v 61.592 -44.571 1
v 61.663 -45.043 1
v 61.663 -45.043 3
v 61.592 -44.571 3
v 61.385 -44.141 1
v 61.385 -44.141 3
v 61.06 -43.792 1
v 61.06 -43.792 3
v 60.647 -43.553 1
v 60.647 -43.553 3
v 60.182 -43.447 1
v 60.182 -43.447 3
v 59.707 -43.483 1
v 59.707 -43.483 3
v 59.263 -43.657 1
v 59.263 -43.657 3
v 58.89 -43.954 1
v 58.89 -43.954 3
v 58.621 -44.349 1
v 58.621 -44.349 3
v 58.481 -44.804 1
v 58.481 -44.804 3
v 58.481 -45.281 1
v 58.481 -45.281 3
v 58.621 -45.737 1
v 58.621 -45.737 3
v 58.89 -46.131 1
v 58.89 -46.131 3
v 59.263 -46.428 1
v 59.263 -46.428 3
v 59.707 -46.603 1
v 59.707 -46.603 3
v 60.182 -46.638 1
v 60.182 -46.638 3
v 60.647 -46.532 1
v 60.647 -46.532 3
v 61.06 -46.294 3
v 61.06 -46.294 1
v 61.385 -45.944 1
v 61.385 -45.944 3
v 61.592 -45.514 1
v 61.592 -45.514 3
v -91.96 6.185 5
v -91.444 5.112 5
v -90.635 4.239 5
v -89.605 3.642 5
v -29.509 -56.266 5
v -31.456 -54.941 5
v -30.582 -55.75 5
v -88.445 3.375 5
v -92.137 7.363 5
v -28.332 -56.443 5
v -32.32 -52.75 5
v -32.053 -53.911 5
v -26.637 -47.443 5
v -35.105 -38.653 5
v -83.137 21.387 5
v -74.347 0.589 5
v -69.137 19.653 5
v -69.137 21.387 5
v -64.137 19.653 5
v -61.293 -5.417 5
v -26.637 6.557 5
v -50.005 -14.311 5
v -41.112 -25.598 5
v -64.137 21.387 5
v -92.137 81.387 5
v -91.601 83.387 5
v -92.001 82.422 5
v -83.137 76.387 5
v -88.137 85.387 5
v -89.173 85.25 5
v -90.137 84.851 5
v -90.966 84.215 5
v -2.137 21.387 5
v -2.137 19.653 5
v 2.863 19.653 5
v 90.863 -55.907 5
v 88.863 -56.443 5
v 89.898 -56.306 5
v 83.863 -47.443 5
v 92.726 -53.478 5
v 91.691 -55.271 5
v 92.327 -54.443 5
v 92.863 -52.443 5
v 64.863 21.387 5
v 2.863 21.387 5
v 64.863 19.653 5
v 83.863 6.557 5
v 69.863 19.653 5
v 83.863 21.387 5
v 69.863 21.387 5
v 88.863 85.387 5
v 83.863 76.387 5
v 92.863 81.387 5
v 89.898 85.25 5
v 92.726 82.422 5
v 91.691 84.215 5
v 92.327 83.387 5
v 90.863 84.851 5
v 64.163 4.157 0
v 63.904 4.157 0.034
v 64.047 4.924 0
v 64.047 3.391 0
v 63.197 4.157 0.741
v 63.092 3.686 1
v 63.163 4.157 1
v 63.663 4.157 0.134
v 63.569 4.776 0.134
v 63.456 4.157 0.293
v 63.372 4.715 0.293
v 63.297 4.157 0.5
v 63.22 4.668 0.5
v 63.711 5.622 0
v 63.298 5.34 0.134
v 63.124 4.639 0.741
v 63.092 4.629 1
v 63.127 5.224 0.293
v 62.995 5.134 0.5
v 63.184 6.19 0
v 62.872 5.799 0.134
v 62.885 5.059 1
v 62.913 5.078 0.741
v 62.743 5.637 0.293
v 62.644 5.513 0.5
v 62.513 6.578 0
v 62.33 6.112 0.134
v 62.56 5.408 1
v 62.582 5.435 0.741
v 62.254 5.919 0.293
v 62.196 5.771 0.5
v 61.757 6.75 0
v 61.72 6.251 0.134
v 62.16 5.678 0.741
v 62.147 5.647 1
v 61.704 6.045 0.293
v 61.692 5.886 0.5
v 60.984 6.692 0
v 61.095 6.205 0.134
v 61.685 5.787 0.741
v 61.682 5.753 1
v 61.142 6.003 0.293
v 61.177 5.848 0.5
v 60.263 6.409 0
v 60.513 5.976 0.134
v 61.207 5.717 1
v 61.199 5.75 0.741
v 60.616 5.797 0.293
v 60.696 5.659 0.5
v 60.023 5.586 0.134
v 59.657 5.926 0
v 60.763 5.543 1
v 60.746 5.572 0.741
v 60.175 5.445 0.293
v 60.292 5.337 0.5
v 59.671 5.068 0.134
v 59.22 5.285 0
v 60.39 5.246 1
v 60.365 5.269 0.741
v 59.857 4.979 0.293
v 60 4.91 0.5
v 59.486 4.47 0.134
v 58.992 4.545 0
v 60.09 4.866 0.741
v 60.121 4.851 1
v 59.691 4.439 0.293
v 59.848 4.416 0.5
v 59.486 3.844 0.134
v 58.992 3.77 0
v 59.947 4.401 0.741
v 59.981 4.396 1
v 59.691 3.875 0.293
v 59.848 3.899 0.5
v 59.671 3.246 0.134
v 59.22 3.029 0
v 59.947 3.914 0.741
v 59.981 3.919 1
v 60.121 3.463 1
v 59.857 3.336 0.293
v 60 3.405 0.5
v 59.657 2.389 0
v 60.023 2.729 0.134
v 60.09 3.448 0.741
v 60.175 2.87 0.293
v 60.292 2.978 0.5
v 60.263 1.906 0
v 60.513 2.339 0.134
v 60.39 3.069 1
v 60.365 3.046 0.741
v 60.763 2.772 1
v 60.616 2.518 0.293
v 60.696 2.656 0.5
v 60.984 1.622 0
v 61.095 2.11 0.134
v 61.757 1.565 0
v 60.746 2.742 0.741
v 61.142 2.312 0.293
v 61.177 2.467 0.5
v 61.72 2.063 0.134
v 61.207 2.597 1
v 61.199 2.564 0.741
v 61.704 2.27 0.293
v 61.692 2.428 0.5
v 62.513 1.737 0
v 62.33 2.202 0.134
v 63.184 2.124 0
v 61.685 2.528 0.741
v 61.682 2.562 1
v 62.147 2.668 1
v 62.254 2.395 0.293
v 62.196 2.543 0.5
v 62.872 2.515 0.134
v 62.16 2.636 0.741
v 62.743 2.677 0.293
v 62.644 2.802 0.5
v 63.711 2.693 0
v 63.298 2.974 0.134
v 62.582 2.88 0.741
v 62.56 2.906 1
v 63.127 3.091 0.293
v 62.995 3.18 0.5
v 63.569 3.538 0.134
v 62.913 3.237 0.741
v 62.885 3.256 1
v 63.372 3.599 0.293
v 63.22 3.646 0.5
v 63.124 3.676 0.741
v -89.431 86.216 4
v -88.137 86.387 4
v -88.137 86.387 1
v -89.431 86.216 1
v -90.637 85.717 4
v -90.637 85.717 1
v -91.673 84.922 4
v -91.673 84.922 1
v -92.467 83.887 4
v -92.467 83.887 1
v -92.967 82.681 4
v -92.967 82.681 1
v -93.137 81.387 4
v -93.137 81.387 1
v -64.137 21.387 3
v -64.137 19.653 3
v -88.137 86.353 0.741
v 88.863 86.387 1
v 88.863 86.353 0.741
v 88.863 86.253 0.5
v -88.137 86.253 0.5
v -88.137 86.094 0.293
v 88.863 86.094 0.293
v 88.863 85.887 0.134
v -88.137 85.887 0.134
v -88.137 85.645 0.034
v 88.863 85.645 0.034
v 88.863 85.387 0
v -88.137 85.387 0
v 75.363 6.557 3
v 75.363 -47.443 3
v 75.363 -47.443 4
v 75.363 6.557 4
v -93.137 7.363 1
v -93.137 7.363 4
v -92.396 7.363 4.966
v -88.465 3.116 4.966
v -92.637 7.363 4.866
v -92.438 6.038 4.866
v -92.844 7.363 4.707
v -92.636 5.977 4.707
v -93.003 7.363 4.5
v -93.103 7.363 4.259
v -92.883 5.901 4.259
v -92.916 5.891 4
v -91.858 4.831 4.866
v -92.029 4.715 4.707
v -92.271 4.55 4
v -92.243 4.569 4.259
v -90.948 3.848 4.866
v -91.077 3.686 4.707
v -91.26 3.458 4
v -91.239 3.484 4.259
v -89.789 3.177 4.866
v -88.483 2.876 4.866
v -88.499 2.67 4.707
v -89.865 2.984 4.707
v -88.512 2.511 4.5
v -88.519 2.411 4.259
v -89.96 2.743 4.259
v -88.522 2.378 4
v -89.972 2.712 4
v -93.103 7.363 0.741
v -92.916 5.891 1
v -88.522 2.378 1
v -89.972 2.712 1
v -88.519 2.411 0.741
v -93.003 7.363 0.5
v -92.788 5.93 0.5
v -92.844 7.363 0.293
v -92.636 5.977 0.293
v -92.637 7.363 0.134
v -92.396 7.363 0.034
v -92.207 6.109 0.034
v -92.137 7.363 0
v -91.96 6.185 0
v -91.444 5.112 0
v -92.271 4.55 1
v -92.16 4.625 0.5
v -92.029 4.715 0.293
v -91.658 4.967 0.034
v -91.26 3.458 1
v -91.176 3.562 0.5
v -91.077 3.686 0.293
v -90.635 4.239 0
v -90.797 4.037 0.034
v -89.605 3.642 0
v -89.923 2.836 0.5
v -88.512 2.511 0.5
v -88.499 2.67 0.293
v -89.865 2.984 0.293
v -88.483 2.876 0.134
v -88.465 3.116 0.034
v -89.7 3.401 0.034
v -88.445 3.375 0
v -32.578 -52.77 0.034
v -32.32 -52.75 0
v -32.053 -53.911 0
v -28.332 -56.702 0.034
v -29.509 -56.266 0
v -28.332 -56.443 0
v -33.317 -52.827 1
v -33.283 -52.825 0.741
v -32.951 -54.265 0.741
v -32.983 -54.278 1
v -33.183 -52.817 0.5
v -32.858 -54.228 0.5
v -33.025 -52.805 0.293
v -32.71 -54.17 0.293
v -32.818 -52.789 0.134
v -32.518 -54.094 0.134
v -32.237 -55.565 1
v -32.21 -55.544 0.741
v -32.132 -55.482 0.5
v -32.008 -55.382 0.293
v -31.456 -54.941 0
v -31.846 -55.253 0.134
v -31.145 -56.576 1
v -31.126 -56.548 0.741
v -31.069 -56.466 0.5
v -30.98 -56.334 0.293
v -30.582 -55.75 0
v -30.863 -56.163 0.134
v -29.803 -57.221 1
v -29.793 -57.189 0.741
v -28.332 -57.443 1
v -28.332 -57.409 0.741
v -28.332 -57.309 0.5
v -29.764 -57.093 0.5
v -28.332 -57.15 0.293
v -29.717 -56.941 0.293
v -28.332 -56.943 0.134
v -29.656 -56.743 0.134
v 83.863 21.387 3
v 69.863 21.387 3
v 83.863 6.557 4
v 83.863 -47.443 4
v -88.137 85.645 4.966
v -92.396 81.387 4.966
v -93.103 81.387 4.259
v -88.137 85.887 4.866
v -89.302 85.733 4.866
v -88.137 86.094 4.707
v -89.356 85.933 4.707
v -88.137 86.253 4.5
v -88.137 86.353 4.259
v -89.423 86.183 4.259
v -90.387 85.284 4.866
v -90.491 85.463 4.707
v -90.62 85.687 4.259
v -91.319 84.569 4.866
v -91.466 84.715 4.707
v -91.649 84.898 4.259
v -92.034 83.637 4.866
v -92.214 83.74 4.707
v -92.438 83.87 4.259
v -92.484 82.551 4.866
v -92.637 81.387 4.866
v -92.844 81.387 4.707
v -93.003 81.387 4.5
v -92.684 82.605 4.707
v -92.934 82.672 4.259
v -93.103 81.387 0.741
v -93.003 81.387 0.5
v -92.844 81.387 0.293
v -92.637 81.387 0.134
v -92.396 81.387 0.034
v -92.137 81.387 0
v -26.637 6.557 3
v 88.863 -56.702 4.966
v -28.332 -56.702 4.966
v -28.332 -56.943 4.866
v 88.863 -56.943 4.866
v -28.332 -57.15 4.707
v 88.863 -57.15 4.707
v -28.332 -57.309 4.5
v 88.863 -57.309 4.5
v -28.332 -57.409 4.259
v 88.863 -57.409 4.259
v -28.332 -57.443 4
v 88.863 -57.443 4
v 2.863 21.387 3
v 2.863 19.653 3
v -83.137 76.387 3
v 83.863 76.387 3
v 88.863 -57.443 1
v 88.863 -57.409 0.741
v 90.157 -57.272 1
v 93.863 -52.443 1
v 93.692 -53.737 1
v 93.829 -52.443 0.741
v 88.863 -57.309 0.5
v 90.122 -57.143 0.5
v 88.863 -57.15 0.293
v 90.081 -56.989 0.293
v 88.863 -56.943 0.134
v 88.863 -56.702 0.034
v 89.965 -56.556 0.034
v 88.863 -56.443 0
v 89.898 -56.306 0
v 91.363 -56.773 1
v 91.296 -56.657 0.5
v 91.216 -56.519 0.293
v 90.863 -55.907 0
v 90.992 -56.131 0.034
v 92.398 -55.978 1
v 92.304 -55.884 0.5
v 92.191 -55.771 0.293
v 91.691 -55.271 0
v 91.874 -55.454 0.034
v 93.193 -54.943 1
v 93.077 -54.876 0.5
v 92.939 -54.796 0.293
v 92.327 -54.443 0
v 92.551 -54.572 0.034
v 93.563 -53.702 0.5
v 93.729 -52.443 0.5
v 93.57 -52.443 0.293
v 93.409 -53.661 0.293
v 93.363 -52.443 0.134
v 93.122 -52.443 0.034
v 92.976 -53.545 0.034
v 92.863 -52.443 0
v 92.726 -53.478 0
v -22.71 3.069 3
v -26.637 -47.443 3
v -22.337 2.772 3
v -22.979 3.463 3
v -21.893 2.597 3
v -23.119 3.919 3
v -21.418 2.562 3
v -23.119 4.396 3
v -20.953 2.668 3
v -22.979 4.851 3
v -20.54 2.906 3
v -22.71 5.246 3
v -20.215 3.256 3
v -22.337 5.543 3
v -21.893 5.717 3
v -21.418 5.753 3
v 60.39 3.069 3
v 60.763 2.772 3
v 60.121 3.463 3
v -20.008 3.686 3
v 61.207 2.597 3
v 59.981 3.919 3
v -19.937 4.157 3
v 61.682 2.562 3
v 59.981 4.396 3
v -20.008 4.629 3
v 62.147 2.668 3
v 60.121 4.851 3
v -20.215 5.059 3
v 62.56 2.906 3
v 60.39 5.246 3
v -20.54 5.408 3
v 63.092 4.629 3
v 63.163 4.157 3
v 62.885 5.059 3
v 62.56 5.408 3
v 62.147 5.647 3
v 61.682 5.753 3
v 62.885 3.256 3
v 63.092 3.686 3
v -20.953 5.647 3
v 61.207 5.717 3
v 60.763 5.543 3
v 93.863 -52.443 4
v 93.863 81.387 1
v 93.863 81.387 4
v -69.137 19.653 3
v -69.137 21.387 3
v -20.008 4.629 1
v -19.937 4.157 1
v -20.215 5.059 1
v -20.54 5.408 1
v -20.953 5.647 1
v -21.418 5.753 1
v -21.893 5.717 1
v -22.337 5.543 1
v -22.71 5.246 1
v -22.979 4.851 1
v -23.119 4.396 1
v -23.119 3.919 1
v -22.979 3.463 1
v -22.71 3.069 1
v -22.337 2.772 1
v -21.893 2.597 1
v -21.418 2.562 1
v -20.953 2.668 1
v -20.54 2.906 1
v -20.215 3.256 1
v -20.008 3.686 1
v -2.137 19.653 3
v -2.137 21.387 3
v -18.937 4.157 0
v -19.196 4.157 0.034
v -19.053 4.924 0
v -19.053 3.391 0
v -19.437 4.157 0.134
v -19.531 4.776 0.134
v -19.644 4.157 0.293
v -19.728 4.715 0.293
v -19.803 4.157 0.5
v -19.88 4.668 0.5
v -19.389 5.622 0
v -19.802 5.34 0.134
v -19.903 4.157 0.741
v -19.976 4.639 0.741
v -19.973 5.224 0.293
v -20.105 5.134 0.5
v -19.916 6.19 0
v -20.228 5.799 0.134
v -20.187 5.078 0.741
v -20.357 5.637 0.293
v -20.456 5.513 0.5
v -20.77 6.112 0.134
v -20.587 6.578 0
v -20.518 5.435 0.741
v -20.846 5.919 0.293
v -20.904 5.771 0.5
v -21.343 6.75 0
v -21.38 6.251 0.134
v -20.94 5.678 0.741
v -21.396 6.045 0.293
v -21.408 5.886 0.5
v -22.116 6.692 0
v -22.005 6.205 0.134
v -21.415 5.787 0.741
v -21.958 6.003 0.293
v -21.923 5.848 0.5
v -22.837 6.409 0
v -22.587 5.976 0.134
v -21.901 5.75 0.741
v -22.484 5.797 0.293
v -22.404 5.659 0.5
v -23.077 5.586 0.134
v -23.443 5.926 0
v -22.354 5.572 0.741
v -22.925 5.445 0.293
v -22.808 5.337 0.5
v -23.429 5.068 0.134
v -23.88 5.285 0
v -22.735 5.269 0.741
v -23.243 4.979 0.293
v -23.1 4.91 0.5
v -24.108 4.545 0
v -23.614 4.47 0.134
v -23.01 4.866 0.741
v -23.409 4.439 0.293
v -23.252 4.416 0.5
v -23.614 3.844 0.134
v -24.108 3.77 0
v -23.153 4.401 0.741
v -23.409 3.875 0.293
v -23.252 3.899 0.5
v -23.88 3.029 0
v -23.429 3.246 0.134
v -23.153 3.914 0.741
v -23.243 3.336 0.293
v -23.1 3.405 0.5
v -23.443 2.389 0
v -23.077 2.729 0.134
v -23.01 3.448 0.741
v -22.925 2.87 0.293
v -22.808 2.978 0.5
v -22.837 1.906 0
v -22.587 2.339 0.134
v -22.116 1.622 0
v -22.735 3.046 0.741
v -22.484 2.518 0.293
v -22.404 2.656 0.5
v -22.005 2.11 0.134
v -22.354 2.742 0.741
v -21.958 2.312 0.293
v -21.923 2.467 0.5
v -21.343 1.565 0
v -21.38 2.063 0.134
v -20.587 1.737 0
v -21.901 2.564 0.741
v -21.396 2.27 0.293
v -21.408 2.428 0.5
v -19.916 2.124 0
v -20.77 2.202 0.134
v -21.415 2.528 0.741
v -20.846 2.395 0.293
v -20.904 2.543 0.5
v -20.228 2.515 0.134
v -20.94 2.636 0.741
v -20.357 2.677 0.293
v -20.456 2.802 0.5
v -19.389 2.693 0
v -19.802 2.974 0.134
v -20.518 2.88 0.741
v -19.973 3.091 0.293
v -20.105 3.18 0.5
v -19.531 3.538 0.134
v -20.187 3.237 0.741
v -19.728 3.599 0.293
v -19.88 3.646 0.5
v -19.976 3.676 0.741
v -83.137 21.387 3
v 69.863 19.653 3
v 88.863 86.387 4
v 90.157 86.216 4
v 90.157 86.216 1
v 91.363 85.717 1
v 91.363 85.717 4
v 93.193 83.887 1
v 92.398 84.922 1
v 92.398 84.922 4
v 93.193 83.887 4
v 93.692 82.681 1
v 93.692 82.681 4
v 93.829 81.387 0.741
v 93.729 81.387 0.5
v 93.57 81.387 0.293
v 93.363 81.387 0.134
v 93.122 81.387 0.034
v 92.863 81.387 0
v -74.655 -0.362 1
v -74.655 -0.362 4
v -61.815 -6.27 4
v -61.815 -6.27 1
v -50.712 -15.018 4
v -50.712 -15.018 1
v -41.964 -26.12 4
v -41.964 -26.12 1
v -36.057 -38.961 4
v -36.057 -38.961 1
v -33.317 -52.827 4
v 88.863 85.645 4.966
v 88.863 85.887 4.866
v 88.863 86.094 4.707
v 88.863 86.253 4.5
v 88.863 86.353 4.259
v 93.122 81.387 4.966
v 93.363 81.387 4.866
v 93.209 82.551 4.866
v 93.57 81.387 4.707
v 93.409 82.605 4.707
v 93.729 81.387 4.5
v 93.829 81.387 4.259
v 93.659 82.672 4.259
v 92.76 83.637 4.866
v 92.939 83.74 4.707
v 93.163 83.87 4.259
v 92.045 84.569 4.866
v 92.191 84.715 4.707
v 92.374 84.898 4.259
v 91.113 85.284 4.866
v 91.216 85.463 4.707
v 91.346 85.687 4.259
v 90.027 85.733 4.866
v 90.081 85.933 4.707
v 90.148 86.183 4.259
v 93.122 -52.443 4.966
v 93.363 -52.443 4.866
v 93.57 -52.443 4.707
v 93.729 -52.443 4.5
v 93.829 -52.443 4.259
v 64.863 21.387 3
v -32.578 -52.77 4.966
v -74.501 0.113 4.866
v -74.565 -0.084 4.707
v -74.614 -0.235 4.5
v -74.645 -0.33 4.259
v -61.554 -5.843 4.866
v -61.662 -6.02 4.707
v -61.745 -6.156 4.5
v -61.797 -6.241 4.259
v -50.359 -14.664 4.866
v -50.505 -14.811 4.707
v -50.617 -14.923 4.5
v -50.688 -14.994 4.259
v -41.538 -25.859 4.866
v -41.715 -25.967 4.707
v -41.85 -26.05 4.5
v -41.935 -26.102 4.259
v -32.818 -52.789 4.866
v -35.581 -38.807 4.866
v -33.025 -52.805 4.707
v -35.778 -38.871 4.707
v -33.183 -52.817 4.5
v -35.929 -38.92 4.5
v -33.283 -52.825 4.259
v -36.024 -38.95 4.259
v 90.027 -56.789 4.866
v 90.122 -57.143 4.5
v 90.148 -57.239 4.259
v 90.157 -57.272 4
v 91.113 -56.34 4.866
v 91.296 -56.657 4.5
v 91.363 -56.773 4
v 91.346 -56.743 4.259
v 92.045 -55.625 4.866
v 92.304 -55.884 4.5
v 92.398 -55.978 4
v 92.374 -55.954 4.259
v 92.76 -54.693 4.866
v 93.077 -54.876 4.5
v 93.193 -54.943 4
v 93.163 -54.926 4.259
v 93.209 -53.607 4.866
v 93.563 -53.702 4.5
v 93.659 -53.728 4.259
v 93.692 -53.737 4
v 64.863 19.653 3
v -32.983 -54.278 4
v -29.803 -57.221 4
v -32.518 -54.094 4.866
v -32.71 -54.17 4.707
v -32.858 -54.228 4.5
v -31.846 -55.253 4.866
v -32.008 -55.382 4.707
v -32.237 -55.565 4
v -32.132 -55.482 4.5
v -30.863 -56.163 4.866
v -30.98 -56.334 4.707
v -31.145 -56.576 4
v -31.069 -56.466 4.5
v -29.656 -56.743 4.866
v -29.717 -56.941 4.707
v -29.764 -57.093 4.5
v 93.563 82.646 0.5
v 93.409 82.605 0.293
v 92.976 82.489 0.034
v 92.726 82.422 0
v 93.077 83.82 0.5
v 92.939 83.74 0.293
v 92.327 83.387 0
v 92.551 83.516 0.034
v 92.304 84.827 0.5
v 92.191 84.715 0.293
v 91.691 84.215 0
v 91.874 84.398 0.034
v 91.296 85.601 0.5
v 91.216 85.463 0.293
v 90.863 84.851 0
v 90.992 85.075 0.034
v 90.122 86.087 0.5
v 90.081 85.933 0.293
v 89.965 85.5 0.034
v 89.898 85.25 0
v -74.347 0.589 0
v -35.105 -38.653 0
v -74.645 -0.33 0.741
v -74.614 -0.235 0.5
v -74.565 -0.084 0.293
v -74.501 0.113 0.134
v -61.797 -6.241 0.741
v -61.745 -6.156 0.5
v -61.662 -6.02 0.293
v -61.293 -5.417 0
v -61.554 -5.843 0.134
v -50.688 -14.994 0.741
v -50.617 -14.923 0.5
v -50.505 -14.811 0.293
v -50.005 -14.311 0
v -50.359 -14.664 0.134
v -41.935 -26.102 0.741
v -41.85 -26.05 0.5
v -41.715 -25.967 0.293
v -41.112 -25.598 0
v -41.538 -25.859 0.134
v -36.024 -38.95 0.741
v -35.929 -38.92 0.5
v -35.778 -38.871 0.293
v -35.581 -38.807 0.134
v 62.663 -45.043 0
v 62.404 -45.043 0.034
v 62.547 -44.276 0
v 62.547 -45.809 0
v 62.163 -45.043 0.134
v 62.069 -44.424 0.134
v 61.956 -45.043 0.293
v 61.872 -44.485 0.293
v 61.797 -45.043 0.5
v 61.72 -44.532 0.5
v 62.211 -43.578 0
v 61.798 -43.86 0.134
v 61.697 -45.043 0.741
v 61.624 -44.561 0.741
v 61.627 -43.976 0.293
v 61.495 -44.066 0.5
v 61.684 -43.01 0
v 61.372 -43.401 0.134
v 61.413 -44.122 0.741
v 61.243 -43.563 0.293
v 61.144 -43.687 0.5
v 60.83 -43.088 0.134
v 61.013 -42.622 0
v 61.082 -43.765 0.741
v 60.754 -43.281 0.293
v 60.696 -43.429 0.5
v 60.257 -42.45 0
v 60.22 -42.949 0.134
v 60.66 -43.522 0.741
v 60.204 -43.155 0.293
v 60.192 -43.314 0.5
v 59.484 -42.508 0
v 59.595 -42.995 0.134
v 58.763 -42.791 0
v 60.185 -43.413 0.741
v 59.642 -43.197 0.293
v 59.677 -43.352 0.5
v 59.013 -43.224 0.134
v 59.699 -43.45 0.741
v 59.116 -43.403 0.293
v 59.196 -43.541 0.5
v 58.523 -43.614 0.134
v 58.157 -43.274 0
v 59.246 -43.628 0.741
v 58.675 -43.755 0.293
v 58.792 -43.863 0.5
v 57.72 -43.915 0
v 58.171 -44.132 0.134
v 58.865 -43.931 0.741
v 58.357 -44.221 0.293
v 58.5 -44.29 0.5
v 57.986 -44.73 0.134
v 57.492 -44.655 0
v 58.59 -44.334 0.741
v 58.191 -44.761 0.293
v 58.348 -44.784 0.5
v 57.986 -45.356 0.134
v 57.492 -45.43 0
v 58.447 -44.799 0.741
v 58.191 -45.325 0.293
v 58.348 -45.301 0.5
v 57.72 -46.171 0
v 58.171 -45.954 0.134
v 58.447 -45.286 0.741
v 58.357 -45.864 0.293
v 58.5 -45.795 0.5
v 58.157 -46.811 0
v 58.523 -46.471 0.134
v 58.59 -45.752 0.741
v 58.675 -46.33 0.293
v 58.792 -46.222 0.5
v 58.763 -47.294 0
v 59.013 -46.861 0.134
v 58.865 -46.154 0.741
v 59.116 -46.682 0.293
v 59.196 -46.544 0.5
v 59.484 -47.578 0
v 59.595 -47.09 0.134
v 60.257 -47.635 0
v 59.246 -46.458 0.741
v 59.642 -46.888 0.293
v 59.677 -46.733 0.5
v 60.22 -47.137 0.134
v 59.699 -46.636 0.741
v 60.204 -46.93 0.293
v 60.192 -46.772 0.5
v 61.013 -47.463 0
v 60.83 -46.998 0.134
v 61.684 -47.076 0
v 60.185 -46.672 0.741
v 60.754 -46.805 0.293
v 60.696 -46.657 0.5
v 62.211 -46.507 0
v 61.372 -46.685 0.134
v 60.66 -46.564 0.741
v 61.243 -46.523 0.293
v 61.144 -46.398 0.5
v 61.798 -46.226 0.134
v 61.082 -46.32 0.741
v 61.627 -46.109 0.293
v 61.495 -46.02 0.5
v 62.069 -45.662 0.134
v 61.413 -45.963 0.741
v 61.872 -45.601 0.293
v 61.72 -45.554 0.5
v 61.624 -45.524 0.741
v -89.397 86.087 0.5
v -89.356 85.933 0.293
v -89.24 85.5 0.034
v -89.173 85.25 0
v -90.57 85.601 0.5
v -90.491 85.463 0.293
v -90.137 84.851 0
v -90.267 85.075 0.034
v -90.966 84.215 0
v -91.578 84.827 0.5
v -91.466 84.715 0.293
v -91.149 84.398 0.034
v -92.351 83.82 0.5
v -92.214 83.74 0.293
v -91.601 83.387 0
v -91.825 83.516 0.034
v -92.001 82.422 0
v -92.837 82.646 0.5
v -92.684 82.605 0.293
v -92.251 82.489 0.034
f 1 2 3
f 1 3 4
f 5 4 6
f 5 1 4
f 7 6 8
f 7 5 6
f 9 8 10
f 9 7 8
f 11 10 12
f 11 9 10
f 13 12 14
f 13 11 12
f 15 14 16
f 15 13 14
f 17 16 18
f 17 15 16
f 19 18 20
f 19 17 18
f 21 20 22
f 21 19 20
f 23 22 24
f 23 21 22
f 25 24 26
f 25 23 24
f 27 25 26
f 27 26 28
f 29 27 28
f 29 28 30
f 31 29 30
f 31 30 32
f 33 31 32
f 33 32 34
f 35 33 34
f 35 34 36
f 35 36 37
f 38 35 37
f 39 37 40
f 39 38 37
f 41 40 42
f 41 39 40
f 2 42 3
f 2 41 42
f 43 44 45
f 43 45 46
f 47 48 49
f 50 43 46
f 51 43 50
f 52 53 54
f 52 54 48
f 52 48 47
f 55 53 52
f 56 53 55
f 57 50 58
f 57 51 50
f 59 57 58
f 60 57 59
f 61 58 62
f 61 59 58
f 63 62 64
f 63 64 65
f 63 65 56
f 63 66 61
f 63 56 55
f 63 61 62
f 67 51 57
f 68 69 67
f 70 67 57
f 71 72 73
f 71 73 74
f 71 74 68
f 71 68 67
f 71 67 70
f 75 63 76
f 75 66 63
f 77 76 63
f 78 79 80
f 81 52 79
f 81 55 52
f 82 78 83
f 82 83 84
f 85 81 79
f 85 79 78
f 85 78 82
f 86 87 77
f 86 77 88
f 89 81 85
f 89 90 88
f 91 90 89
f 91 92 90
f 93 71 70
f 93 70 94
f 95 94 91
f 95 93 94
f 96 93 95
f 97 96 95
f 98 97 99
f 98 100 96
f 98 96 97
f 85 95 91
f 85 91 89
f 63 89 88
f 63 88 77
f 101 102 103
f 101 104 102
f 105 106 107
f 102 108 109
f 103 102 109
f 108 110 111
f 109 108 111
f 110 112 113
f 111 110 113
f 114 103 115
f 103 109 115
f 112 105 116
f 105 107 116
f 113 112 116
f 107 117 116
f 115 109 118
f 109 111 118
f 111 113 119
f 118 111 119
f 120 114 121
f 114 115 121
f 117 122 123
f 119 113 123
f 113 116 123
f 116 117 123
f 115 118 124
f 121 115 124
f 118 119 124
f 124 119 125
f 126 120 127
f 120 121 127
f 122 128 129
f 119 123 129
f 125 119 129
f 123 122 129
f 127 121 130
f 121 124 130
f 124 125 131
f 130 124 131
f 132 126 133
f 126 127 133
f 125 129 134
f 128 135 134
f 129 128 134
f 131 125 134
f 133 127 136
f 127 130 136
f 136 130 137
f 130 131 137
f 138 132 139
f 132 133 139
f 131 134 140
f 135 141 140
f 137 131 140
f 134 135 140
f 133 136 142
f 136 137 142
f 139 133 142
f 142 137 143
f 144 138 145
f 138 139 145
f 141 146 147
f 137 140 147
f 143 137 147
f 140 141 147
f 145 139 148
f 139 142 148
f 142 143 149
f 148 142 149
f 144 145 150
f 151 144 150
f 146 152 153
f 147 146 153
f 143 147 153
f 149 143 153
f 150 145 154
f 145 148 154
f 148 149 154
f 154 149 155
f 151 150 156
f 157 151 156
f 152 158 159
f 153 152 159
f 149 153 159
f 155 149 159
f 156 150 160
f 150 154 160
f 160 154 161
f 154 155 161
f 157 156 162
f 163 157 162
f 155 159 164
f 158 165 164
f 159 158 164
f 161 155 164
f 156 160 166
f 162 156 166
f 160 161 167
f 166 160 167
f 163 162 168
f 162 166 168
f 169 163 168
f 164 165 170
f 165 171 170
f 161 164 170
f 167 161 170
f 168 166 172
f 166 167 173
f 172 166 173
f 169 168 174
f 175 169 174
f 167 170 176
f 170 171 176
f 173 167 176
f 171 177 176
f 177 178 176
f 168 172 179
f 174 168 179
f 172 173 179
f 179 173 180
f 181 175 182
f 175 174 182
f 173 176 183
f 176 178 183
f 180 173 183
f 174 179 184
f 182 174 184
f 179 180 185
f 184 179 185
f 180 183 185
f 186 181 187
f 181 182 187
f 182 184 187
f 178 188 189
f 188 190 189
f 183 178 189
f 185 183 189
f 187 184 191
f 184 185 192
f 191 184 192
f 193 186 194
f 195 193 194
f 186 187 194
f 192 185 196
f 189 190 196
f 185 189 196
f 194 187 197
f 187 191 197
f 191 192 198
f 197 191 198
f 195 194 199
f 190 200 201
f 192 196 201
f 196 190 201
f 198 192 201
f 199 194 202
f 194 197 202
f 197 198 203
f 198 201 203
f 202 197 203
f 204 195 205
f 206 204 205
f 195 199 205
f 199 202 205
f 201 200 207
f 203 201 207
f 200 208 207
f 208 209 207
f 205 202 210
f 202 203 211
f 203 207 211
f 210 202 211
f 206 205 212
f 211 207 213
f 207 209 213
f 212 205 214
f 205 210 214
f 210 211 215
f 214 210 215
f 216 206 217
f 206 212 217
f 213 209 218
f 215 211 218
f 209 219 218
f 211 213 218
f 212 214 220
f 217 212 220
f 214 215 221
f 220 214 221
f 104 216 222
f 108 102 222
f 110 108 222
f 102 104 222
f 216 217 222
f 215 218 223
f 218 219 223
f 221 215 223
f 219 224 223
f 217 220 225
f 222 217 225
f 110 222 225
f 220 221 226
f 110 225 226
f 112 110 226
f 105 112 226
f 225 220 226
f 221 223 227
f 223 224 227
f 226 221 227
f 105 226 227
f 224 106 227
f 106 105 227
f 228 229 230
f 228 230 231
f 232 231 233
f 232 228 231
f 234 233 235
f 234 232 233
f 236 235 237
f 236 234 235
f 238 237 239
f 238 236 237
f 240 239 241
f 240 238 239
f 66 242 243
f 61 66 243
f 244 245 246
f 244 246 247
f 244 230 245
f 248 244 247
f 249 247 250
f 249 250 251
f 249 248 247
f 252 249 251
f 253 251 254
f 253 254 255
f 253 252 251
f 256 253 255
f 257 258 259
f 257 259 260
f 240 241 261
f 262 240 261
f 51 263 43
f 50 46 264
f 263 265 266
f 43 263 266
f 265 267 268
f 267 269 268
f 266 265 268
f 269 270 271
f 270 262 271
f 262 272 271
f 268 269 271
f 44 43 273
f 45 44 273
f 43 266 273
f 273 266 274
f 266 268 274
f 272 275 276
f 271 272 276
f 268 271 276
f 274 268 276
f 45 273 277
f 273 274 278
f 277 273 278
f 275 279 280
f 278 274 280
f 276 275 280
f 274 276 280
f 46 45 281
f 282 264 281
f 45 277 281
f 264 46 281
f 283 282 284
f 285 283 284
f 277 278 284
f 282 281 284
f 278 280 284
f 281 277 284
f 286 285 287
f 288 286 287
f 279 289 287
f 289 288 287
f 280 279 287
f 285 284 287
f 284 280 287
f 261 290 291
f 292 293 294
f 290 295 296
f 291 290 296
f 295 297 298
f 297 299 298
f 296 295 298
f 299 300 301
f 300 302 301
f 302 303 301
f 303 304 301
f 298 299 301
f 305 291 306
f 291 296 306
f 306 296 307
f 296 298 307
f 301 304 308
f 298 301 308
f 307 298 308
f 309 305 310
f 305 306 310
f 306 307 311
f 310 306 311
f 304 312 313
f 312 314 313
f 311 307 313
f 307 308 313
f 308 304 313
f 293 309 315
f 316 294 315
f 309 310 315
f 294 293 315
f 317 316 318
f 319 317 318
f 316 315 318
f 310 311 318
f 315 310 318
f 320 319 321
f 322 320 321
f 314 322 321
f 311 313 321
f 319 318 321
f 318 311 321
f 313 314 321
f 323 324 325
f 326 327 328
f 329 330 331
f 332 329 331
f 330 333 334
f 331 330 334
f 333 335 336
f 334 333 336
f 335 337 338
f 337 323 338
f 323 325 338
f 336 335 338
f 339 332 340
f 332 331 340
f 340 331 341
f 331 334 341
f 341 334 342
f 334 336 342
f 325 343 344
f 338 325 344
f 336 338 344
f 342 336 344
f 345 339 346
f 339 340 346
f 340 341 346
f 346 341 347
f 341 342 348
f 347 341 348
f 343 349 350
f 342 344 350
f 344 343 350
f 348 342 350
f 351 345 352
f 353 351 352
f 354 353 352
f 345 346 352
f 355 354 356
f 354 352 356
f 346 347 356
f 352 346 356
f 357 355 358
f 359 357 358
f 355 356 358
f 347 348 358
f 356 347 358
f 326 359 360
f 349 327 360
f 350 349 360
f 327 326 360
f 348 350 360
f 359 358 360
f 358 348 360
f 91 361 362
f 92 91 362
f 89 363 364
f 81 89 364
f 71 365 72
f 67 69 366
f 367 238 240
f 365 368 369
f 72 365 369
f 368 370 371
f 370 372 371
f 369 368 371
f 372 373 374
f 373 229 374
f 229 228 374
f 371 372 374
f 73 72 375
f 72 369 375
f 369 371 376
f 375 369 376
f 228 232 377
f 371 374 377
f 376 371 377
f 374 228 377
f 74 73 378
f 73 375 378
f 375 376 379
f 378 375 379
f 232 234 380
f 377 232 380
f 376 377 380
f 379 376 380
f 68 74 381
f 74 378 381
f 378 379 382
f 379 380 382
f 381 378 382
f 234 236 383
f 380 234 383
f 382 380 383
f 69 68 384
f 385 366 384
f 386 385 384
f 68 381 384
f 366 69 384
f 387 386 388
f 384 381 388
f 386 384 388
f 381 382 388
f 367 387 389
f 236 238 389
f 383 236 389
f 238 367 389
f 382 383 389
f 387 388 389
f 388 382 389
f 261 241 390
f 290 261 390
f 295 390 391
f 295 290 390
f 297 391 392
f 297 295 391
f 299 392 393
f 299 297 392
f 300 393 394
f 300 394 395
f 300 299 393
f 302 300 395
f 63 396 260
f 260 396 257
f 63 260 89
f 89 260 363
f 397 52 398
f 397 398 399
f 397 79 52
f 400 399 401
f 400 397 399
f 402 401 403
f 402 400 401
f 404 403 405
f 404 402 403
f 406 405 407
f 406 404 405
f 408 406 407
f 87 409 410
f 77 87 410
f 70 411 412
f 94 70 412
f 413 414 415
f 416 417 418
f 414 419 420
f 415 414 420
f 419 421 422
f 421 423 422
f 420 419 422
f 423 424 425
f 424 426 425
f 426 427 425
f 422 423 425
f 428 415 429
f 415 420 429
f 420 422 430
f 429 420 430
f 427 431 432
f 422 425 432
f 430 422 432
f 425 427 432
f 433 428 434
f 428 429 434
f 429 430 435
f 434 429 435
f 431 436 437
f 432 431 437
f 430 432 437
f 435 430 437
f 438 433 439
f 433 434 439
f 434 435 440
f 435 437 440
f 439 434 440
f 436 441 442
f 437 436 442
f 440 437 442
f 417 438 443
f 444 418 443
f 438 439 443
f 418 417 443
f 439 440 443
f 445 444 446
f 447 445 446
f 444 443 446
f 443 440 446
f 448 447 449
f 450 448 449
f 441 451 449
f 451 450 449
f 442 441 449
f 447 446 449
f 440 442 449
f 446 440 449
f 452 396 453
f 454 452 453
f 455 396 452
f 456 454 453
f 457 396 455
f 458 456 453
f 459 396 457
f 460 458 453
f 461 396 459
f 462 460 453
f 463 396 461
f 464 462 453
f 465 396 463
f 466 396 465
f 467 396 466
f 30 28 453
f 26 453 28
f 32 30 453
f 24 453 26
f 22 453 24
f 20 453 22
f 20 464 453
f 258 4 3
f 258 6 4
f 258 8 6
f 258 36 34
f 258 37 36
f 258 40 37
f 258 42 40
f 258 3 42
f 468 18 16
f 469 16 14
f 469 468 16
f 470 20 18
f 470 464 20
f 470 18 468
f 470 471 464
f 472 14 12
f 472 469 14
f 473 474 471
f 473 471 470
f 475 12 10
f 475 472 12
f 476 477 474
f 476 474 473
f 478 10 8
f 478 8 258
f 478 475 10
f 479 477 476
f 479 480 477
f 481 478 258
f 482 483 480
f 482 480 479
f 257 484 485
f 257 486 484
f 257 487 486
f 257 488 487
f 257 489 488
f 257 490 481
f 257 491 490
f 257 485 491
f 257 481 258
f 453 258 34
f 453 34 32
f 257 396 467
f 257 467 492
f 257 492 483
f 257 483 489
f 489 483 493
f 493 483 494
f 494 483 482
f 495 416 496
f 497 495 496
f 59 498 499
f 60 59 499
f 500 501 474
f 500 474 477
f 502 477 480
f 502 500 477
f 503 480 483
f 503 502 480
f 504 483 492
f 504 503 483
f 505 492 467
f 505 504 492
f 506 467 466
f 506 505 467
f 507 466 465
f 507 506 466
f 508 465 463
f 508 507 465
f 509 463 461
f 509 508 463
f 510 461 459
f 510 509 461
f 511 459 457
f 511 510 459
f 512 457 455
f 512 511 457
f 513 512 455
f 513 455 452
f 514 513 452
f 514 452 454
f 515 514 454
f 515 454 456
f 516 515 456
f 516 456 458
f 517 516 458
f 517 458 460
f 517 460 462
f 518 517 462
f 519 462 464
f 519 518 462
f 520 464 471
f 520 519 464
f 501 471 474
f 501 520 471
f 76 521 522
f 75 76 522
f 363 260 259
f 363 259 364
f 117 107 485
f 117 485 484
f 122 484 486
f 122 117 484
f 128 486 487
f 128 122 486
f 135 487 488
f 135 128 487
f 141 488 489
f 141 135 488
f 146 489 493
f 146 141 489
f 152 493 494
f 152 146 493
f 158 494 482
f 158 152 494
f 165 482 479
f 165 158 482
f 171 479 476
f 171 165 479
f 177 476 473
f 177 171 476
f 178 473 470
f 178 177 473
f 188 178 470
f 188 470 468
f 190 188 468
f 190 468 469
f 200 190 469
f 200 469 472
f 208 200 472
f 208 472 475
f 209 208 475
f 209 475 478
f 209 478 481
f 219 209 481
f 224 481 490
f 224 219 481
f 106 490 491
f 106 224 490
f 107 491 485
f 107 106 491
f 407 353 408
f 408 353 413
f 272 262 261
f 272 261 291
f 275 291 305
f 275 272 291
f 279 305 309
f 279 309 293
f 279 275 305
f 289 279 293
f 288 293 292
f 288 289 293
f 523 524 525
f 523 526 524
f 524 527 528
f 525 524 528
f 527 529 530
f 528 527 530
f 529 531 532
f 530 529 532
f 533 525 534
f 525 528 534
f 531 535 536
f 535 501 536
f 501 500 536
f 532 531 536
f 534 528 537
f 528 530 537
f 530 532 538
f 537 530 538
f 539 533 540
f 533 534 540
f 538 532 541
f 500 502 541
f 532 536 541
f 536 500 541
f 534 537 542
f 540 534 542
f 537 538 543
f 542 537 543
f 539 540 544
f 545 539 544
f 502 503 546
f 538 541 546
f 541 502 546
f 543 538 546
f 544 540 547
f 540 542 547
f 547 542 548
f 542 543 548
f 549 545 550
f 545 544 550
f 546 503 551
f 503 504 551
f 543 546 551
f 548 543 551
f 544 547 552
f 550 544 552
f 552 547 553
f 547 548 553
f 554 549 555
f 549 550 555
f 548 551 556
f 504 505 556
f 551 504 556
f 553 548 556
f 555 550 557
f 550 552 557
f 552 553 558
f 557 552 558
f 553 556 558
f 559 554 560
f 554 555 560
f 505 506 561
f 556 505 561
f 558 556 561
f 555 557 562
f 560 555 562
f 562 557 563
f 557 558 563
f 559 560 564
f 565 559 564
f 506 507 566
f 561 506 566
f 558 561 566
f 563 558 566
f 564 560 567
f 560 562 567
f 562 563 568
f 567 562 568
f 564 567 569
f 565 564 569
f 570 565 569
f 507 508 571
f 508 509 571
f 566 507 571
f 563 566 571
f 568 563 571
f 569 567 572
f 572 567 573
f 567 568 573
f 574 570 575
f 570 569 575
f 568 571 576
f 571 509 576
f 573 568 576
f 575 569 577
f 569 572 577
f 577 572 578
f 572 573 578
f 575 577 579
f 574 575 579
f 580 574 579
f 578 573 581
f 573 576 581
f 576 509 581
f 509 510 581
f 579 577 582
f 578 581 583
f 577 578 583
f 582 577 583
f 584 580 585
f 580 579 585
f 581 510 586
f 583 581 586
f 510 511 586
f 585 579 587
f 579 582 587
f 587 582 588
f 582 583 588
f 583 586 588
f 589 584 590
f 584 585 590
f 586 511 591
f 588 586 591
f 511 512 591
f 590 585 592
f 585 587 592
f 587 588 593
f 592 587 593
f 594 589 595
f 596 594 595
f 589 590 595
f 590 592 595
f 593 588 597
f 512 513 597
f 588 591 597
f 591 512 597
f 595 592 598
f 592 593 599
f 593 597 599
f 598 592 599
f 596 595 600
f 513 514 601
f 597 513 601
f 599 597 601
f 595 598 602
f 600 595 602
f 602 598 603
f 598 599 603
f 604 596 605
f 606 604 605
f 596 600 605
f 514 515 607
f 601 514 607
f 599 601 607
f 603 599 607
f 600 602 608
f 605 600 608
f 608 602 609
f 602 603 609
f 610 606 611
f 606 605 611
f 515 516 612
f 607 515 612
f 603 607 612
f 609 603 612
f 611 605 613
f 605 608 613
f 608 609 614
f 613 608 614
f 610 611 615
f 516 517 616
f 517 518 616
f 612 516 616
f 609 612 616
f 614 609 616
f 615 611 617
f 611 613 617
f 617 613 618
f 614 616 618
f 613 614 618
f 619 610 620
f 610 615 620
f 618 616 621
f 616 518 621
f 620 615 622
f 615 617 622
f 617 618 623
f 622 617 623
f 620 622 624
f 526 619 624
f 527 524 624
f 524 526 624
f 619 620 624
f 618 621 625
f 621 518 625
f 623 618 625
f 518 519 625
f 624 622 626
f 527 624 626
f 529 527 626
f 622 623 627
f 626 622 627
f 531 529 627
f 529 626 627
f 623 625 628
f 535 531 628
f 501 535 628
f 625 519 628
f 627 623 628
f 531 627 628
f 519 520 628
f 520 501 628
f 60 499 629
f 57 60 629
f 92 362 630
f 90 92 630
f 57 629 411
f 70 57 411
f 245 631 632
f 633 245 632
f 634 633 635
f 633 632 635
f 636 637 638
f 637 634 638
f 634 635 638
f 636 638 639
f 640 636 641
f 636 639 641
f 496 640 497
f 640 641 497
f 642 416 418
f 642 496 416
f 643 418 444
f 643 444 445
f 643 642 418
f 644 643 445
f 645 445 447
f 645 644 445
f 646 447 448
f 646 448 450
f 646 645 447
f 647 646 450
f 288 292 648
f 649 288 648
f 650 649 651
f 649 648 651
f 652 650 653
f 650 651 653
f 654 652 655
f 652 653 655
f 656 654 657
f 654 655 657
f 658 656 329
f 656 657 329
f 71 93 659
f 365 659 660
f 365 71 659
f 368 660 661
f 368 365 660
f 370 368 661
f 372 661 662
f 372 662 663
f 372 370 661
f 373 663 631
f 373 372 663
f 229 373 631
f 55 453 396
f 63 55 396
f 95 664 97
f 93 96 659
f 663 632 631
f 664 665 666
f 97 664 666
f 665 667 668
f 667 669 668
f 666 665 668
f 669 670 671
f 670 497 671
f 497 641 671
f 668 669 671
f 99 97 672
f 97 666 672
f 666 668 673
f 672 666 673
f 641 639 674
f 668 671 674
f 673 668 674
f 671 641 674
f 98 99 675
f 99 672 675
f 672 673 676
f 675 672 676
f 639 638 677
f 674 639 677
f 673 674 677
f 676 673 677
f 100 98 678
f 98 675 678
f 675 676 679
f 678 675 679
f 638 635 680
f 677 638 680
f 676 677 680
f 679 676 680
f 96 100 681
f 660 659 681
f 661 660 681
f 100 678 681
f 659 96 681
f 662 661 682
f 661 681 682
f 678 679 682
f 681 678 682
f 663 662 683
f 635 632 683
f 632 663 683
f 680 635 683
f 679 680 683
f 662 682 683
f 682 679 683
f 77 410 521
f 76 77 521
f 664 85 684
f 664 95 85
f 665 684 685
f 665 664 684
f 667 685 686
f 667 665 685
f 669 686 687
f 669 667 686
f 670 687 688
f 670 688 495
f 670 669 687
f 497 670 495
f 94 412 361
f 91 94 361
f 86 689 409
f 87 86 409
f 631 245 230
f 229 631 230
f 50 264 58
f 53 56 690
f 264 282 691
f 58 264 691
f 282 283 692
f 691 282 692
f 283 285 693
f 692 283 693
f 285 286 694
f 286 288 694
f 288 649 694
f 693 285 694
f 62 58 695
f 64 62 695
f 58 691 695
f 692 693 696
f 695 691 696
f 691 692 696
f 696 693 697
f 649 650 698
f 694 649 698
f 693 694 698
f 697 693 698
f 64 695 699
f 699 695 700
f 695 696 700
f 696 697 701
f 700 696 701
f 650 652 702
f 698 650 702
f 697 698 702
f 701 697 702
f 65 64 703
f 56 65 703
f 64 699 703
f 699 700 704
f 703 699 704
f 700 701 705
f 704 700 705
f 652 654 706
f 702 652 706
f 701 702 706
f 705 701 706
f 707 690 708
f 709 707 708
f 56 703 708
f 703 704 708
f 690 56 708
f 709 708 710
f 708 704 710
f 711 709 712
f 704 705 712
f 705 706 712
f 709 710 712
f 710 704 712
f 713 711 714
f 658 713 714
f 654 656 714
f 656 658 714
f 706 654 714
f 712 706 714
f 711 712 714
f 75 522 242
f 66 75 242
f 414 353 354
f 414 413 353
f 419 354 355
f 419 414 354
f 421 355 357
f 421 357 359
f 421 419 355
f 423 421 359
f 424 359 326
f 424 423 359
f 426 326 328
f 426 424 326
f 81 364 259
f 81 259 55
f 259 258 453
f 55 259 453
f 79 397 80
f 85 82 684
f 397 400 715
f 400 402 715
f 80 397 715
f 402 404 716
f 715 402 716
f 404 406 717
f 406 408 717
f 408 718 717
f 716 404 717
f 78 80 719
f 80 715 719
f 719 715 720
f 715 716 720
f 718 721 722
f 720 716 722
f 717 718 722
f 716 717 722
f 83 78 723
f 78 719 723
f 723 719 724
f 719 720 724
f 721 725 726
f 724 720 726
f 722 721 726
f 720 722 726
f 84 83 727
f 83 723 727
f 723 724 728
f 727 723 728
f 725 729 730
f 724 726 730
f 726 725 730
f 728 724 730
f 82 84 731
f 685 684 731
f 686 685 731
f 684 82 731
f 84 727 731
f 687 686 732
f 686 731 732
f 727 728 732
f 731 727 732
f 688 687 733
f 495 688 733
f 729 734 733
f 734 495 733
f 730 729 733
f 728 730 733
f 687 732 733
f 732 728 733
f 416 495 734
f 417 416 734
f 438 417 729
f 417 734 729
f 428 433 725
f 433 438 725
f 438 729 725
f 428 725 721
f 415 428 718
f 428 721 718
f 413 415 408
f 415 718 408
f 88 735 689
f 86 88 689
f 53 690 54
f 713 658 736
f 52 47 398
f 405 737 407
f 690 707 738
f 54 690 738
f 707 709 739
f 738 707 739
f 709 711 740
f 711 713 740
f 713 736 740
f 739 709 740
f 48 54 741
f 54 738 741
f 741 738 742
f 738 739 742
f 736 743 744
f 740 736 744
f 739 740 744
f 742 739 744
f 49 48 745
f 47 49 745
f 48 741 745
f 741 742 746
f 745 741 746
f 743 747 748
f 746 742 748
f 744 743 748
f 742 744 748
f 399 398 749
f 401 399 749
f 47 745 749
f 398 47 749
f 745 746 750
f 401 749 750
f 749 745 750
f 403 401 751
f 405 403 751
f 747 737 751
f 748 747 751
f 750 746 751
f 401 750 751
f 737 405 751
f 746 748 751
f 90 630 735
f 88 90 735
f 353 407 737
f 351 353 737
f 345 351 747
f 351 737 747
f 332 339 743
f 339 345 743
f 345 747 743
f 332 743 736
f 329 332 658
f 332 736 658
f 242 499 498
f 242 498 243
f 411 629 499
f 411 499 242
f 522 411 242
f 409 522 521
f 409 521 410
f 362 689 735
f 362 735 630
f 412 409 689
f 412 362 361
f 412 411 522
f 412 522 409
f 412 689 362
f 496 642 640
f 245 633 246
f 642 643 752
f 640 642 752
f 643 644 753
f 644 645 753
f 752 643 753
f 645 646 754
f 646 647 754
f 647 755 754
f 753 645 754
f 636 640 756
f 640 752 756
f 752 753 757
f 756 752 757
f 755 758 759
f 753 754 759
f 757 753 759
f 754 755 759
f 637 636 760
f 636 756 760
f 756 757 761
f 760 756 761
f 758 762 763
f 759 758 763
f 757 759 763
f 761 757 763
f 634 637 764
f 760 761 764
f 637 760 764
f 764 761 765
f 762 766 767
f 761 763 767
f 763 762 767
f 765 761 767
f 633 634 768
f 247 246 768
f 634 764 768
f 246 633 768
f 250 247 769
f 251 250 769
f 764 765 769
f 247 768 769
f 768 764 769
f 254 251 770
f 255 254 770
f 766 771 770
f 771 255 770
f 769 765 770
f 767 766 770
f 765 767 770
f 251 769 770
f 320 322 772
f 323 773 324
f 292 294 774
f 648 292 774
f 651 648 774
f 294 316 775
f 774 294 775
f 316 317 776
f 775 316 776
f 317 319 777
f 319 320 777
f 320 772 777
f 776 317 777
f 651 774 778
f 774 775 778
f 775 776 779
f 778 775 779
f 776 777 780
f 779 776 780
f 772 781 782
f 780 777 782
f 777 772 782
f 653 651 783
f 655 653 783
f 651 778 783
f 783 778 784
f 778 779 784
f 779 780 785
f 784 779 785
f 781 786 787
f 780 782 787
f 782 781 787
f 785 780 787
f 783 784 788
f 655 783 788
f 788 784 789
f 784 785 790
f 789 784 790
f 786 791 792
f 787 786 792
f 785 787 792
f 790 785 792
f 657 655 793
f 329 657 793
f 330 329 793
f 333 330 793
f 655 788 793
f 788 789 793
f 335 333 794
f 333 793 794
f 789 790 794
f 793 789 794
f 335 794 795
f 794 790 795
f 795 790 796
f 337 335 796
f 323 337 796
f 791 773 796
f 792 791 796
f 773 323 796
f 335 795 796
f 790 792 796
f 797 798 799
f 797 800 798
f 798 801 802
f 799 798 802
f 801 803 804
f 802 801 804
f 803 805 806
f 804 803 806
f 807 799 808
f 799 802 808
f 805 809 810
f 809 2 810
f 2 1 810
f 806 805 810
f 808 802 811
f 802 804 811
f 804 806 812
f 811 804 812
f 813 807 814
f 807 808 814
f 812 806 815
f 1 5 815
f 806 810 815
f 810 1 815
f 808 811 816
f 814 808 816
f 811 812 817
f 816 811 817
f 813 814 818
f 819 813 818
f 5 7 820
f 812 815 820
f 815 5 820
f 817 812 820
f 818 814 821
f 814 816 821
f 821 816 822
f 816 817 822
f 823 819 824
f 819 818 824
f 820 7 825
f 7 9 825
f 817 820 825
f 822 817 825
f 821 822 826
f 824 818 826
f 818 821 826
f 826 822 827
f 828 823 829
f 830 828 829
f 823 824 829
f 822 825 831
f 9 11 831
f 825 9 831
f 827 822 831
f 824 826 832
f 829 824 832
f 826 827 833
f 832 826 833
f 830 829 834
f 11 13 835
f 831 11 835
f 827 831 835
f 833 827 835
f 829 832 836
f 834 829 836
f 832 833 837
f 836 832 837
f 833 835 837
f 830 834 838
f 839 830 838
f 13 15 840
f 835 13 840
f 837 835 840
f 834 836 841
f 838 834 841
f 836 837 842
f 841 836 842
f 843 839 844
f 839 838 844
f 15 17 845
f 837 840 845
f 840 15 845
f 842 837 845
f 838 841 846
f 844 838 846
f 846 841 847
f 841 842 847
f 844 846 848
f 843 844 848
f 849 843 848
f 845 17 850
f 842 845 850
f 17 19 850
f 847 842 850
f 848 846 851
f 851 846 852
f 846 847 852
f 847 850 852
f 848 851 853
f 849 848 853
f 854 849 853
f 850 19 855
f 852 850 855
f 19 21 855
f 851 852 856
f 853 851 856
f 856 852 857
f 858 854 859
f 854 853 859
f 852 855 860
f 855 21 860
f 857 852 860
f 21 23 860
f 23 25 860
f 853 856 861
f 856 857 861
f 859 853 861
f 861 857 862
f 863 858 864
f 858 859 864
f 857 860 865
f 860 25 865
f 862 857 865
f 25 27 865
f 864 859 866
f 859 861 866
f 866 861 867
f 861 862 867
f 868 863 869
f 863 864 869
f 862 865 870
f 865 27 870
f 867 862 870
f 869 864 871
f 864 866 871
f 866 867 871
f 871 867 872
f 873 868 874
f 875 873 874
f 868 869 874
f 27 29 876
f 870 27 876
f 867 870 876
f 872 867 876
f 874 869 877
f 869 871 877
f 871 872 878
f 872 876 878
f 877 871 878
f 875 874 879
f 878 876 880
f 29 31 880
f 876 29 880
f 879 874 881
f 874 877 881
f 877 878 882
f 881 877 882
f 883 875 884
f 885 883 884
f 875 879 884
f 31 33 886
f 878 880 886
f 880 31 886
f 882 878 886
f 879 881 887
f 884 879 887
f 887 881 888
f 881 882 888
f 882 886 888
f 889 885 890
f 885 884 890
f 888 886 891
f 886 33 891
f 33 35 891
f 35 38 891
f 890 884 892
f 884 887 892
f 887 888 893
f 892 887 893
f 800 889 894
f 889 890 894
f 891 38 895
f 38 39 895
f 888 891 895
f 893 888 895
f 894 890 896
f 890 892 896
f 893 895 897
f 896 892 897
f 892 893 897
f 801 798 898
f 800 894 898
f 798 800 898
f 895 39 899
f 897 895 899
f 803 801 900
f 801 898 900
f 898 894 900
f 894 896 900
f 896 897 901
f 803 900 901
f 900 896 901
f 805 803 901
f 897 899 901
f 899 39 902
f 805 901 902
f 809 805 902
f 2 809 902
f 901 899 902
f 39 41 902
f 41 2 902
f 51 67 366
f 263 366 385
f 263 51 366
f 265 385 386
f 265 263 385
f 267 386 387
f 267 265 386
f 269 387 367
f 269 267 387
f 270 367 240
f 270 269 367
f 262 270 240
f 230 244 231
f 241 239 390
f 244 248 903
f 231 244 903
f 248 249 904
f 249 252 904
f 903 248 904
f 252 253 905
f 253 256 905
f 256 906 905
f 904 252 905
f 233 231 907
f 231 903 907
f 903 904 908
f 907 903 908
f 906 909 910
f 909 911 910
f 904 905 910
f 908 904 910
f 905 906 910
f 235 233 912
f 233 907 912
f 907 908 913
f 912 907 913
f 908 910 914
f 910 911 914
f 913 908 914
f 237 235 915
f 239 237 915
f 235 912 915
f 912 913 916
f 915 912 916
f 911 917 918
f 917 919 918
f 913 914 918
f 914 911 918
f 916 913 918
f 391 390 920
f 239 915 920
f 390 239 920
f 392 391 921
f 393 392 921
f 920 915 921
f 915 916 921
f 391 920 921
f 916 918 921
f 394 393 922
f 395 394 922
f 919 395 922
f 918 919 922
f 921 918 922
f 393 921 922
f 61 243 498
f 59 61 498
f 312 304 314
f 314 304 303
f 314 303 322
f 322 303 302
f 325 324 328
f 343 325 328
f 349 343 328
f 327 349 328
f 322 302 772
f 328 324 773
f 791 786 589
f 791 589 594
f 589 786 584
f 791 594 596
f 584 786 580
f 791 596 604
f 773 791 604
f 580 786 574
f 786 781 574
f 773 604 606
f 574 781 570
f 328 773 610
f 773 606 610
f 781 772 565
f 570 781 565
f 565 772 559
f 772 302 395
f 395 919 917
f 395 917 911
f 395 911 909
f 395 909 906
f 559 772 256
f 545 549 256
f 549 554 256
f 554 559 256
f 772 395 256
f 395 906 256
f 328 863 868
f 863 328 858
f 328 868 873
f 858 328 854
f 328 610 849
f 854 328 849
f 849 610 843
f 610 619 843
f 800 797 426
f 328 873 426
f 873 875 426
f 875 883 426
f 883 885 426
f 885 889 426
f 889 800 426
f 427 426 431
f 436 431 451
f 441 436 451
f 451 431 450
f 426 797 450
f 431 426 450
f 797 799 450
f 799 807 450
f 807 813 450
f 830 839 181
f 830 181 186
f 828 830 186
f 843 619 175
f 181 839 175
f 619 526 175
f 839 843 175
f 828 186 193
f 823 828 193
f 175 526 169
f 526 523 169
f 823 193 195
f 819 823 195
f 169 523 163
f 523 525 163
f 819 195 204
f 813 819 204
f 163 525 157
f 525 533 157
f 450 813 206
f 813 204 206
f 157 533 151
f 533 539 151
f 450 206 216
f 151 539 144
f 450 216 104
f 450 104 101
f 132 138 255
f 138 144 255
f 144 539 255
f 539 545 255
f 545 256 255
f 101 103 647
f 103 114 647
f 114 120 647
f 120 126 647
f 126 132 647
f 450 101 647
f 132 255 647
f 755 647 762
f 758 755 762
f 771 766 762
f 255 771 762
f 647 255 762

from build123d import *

# Parameters (mm, degrees)
F1_DEPTH = 5
F0_W     = 102
F0_H     = 54
F0_R     = 1.6
F2_DEPTH = 3
F0_W_2   = 8.5
F3_DEPTH = 4
F4_R     = 5
F5_R     = 1


with BuildPart() as f1:
    # F0 (on Top) → F1 (new body)
    with BuildSketch(Plane.XY):
        with BuildLine():
            Line((93.8627476096, 86.3866787127), (-93.1372523904, 86.3866787127))
            Line((-93.1372523904, 86.3866787127), (-93.1372523904, 2.5552856157))
            ThreePointArc((-93.1372523904, 2.5552856157), (-50.7122317842, -15.0177333034), (-33.1392128652, -57.4427539095))
            Line((-33.1392128652, -57.4427539095), (93.8627476096, -57.4427539095))
            Line((93.8627476096, -57.4427539095), (93.8627476096, 86.3866787127))
        make_face()
        Polygon((-26.6372523904, -47.4427539095), (-26.6372523904, 6.5572460905), (75.3627476096, 6.5572460905), (83.8627476096, 6.5572460905), (83.8627476096, -47.4427539095), (75.3627476096, -47.4427539095), align=None, mode=Mode.SUBTRACT)
        Polygon((-83.1372523904, 21.3866787127), (-83.1372523904, 76.3866787127), (83.8627476096, 76.3866787127), (83.8627476096, 21.3866787127), (69.8627476096, 21.3866787127), (69.8627476096, 19.6525212377), (64.8627476096, 19.6525212377), (64.8627476096, 21.3866787127), (2.8627476096, 21.3866787127), (2.8627476096, 19.6525212377), (-2.1372523904, 19.6525212377), (-2.1372523904, 21.3866787127), (-64.1372523904, 21.3866787127), (-64.1372523904, 19.6525212377), (-69.1372523904, 19.6525212377), (-69.1372523904, 21.3866787127), align=None, mode=Mode.SUBTRACT)
    extrude(amount=F1_DEPTH)

    # F0 (on Top) → F2 (join)
    with BuildSketch(Plane.XY):
        Polygon((83.8627476096, 76.3866787127), (-83.1372523904, 76.3866787127), (-83.1372523904, 21.3866787127), (-69.1372523904, 21.3866787127), (-69.1372523904, 19.6525212377), (-64.1372523904, 19.6525212377), (-64.1372523904, 21.3866787127), (-2.1372523904, 21.3866787127), (-2.1372523904, 19.6525212377), (2.8627476096, 19.6525212377), (2.8627476096, 21.3866787127), (64.8627476096, 21.3866787127), (64.8627476096, 19.6525212377), (69.8627476096, 19.6525212377), (69.8627476096, 21.3866787127), (83.8627476096, 21.3866787127), align=None)
        with Locations((24.3627476096, -20.4427539095)):
            Rectangle(F0_W, F0_H)
        with Locations((-21.5372523904, 4.1572460905)):
            Circle(F0_R, mode=Mode.SUBTRACT)
        with Locations((60.0627476096, -45.0427539095)):
            Circle(F0_R, mode=Mode.SUBTRACT)
        with Locations((61.5627476096, 4.1572460905)):
            Circle(F0_R, mode=Mode.SUBTRACT)
    extrude(amount=F2_DEPTH)

    # F0 (on Top) → F3 (join)
    with BuildSketch(Plane.XY):
        with Locations((79.6127476096, -20.4427539095)):
            Rectangle(F0_W_2, F0_H)
    extrude(amount=F3_DEPTH)

    # F4
    f4_edges = [f1.edges().sort_by_distance(p)[0] for p in [
        (93.862748, -57.442754, 2.5),
        (93.862748, 86.386679, 2.5),
        (-93.137252, 86.386679, 2.5),
        (-33.139213, -57.442754, 2.5),
        (-93.137252, 2.555286, 2.5),
    ]]
    fillet(f4_edges, radius=F4_R)

    # F5
    f5_edges = [f1.edges().sort_by_distance(p)[0] for p in [
        (93.862748, 14.471962, 5),
        (93.862748, 14.471962, 0),
        (92.398282, -55.978288, 0),
        (92.398282, 84.922213, 0),
        (30.265468, -57.442754, 0),
        (0.362748, 86.386679, 0),
        (-31.728639, -56.111755, 0),
        (-91.672786, 84.922213, 0),
        (-50.712232, -15.017733, 0),
        (-93.137252, 44.374683, 0),
        (-91.806253, 3.96586, 0),
        (59.962748, 4.157246, 0),
        (-23.137252, 4.157246, 0),
        (58.462748, -45.042754, 0),
        (92.398282, -55.978288, 5),
        (92.398282, 84.922213, 5),
        (30.265468, -57.442754, 5),
        (0.362748, 86.386679, 5),
        (-31.728639, -56.111755, 5),
        (-91.672786, 84.922213, 5),
        (-50.712232, -15.017733, 5),
        (-93.137252, 44.374683, 5),
        (-91.806253, 3.96586, 5),
    ]]
    fillet(f5_edges, radius=F5_R)


solid = f1.part
